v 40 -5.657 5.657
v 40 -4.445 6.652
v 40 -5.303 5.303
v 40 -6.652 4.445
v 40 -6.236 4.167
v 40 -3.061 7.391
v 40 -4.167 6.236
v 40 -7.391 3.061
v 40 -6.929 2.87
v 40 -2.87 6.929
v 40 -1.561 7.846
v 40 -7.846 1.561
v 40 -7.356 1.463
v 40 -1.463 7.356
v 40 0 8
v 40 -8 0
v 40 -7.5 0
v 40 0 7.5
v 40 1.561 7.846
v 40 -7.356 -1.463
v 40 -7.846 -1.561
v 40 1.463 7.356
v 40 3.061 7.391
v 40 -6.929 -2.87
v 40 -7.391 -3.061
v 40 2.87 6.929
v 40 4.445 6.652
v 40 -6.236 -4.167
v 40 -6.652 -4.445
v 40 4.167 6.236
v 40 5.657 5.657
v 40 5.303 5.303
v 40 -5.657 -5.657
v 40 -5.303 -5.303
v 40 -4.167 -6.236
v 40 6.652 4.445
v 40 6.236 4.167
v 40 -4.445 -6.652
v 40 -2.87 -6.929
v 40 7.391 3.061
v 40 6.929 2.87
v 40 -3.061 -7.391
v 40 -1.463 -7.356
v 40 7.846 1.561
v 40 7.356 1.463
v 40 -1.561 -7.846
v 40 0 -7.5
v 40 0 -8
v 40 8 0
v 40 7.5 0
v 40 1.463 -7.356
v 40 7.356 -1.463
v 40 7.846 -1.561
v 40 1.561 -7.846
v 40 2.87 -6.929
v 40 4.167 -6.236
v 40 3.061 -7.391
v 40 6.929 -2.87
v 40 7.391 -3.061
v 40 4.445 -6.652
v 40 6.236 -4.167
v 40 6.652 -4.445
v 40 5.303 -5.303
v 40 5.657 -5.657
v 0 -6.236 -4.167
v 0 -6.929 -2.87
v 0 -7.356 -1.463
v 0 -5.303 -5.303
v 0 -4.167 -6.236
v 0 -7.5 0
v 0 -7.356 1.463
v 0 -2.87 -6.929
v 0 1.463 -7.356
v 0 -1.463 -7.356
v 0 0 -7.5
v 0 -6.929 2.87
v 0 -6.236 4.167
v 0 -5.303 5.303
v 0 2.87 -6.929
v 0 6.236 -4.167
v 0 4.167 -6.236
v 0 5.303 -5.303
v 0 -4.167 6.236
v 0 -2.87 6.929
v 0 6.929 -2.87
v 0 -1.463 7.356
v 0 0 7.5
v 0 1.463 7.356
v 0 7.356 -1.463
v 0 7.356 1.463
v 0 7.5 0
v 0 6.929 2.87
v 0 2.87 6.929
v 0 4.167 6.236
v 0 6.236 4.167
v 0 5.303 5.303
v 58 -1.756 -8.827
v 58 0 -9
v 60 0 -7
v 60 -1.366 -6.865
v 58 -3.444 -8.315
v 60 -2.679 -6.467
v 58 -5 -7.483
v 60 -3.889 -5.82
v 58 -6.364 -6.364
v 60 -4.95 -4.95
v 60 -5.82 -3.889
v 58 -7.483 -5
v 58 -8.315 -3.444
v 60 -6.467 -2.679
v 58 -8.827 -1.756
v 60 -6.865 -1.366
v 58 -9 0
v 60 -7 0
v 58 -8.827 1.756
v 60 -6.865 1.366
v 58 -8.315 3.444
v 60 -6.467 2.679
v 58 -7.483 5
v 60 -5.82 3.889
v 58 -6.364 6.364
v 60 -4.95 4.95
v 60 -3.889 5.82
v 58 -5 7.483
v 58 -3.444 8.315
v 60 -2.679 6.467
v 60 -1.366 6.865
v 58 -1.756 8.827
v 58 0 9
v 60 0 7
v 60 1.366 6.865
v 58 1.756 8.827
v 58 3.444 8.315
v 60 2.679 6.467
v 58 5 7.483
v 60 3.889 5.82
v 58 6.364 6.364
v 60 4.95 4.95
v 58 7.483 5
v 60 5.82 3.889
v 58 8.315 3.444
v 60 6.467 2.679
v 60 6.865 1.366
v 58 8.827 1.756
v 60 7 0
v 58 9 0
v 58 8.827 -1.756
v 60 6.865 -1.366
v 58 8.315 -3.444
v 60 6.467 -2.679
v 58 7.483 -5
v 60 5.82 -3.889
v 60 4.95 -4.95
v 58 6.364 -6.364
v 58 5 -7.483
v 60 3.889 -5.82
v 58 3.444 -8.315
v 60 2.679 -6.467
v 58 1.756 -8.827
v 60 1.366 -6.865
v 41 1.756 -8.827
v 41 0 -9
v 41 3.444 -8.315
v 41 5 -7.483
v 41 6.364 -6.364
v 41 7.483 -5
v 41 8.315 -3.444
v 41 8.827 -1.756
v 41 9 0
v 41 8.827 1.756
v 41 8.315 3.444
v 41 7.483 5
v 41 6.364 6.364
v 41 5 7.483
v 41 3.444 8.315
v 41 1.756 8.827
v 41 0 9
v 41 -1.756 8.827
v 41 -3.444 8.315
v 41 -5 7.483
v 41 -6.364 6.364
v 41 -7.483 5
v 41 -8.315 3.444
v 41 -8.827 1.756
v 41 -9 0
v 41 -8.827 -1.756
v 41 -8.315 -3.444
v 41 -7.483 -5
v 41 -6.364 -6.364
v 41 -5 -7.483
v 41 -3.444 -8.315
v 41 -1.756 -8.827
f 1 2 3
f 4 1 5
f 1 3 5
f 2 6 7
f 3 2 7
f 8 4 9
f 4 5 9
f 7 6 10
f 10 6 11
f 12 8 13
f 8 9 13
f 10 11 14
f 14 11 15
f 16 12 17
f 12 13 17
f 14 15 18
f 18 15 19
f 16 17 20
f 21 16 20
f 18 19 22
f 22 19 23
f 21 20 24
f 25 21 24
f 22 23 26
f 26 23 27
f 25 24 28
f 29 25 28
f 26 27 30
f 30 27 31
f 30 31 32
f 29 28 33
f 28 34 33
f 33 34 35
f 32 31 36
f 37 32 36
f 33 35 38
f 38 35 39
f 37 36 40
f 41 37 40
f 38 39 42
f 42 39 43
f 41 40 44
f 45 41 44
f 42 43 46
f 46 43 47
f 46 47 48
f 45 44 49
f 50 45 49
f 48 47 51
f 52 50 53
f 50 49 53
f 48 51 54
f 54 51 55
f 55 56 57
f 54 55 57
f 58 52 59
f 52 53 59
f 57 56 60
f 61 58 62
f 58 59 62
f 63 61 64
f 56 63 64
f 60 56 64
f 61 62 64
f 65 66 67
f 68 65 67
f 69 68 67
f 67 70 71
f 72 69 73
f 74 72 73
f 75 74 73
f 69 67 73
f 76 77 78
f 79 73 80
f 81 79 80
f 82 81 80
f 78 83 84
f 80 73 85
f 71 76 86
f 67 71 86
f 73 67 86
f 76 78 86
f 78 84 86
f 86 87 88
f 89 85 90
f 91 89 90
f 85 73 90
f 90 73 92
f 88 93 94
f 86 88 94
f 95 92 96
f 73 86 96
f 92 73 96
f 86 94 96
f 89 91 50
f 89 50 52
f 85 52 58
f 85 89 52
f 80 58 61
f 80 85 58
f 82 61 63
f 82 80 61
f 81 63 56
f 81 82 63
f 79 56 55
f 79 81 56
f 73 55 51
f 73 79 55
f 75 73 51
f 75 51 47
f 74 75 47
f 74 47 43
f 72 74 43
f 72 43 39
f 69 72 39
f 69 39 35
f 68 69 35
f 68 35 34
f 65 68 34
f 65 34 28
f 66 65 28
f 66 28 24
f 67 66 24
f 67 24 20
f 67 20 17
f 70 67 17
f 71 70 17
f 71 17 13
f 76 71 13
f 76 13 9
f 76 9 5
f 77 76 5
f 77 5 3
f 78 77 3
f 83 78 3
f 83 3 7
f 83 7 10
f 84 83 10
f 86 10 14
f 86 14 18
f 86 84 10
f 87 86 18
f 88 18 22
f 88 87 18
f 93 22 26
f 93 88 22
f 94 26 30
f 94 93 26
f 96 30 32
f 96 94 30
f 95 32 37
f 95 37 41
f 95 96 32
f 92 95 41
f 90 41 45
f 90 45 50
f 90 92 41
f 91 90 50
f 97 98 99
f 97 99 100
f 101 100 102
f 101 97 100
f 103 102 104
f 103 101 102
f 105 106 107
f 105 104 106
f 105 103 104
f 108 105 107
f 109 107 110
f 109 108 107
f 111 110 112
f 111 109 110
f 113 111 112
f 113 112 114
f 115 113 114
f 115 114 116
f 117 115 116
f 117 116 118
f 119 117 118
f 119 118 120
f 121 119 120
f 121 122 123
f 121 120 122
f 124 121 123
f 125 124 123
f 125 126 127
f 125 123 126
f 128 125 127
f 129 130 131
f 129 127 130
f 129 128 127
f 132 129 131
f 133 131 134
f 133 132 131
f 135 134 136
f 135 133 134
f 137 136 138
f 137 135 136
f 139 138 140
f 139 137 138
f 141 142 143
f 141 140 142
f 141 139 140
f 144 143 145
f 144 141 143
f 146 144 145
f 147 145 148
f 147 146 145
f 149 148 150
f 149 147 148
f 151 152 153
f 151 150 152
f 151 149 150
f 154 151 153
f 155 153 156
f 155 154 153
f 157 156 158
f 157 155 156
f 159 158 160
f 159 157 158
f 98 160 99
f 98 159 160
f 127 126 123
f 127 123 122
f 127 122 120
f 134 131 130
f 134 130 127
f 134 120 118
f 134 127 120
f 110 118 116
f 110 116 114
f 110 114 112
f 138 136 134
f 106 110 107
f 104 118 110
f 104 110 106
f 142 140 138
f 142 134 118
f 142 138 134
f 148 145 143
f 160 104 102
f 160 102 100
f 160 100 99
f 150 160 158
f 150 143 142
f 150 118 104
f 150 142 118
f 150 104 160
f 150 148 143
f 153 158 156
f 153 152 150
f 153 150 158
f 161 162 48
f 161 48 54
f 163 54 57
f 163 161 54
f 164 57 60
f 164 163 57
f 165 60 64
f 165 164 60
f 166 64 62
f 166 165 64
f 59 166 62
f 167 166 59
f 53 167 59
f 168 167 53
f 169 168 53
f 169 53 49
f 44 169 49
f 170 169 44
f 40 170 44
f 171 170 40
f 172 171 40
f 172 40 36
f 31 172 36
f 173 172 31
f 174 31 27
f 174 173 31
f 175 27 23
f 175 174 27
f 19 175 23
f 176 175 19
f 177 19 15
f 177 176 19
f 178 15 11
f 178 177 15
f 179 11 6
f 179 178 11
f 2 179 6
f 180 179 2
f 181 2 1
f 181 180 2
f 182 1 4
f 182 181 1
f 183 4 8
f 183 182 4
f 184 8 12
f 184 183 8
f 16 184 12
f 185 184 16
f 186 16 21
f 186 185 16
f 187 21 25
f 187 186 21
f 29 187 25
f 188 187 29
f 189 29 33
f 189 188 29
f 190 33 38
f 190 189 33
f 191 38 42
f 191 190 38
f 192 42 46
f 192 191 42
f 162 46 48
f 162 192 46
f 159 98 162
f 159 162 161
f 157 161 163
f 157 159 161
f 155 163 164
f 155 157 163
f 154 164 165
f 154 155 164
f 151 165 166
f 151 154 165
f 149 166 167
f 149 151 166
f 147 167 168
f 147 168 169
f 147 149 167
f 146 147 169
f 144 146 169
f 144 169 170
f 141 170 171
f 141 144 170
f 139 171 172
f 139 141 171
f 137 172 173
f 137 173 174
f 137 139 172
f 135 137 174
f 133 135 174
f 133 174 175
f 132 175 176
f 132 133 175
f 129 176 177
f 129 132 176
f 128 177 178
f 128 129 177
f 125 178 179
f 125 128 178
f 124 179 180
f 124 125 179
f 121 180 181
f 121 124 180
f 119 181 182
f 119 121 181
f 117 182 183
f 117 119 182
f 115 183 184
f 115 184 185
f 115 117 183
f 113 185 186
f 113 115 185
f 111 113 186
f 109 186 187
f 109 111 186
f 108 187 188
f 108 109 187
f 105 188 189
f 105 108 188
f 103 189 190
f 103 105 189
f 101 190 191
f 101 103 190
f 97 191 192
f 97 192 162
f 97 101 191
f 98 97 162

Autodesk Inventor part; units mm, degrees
ref_plane "YZ Plane" through (0, 0, 0) normal (1, 0, 0) x (0, 1, 0)
ref_plane "XZ Plane" through (0, 0, 0) normal (0, 1, 0) x (-1, 0, 0)
ref_plane "XY Plane" through (0, 0, 0) normal (0, 0, 1) x (1, 0, 0)
sketch "Sketch1" plane through (0, 0, 0) normal (1, 0, 0) x (0, 1, 0)
  circle A0 centre (0, 0) radius 7.5
  dimension "d0" = 15
extrude "Extrusion1" add sketch "Sketch1" along normal blind 60
sketch "Sketch2" plane through (60, 0, 0) normal (1, 0, 0) x (0, 0, -1)
  circle A0 centre (0, 0) radius 9
  dimension "d5" = 18
extrude "Extrusion2" add sketch "Sketch2" against normal blind 20
chamfer "Chamfer1" distance 2 angle 45 1 edges at (60, 0, 9)
chamfer "Chamfer2" distance 1 angle 45 1 edges at (40, 0, 9)
properties part number "Enbolo"
